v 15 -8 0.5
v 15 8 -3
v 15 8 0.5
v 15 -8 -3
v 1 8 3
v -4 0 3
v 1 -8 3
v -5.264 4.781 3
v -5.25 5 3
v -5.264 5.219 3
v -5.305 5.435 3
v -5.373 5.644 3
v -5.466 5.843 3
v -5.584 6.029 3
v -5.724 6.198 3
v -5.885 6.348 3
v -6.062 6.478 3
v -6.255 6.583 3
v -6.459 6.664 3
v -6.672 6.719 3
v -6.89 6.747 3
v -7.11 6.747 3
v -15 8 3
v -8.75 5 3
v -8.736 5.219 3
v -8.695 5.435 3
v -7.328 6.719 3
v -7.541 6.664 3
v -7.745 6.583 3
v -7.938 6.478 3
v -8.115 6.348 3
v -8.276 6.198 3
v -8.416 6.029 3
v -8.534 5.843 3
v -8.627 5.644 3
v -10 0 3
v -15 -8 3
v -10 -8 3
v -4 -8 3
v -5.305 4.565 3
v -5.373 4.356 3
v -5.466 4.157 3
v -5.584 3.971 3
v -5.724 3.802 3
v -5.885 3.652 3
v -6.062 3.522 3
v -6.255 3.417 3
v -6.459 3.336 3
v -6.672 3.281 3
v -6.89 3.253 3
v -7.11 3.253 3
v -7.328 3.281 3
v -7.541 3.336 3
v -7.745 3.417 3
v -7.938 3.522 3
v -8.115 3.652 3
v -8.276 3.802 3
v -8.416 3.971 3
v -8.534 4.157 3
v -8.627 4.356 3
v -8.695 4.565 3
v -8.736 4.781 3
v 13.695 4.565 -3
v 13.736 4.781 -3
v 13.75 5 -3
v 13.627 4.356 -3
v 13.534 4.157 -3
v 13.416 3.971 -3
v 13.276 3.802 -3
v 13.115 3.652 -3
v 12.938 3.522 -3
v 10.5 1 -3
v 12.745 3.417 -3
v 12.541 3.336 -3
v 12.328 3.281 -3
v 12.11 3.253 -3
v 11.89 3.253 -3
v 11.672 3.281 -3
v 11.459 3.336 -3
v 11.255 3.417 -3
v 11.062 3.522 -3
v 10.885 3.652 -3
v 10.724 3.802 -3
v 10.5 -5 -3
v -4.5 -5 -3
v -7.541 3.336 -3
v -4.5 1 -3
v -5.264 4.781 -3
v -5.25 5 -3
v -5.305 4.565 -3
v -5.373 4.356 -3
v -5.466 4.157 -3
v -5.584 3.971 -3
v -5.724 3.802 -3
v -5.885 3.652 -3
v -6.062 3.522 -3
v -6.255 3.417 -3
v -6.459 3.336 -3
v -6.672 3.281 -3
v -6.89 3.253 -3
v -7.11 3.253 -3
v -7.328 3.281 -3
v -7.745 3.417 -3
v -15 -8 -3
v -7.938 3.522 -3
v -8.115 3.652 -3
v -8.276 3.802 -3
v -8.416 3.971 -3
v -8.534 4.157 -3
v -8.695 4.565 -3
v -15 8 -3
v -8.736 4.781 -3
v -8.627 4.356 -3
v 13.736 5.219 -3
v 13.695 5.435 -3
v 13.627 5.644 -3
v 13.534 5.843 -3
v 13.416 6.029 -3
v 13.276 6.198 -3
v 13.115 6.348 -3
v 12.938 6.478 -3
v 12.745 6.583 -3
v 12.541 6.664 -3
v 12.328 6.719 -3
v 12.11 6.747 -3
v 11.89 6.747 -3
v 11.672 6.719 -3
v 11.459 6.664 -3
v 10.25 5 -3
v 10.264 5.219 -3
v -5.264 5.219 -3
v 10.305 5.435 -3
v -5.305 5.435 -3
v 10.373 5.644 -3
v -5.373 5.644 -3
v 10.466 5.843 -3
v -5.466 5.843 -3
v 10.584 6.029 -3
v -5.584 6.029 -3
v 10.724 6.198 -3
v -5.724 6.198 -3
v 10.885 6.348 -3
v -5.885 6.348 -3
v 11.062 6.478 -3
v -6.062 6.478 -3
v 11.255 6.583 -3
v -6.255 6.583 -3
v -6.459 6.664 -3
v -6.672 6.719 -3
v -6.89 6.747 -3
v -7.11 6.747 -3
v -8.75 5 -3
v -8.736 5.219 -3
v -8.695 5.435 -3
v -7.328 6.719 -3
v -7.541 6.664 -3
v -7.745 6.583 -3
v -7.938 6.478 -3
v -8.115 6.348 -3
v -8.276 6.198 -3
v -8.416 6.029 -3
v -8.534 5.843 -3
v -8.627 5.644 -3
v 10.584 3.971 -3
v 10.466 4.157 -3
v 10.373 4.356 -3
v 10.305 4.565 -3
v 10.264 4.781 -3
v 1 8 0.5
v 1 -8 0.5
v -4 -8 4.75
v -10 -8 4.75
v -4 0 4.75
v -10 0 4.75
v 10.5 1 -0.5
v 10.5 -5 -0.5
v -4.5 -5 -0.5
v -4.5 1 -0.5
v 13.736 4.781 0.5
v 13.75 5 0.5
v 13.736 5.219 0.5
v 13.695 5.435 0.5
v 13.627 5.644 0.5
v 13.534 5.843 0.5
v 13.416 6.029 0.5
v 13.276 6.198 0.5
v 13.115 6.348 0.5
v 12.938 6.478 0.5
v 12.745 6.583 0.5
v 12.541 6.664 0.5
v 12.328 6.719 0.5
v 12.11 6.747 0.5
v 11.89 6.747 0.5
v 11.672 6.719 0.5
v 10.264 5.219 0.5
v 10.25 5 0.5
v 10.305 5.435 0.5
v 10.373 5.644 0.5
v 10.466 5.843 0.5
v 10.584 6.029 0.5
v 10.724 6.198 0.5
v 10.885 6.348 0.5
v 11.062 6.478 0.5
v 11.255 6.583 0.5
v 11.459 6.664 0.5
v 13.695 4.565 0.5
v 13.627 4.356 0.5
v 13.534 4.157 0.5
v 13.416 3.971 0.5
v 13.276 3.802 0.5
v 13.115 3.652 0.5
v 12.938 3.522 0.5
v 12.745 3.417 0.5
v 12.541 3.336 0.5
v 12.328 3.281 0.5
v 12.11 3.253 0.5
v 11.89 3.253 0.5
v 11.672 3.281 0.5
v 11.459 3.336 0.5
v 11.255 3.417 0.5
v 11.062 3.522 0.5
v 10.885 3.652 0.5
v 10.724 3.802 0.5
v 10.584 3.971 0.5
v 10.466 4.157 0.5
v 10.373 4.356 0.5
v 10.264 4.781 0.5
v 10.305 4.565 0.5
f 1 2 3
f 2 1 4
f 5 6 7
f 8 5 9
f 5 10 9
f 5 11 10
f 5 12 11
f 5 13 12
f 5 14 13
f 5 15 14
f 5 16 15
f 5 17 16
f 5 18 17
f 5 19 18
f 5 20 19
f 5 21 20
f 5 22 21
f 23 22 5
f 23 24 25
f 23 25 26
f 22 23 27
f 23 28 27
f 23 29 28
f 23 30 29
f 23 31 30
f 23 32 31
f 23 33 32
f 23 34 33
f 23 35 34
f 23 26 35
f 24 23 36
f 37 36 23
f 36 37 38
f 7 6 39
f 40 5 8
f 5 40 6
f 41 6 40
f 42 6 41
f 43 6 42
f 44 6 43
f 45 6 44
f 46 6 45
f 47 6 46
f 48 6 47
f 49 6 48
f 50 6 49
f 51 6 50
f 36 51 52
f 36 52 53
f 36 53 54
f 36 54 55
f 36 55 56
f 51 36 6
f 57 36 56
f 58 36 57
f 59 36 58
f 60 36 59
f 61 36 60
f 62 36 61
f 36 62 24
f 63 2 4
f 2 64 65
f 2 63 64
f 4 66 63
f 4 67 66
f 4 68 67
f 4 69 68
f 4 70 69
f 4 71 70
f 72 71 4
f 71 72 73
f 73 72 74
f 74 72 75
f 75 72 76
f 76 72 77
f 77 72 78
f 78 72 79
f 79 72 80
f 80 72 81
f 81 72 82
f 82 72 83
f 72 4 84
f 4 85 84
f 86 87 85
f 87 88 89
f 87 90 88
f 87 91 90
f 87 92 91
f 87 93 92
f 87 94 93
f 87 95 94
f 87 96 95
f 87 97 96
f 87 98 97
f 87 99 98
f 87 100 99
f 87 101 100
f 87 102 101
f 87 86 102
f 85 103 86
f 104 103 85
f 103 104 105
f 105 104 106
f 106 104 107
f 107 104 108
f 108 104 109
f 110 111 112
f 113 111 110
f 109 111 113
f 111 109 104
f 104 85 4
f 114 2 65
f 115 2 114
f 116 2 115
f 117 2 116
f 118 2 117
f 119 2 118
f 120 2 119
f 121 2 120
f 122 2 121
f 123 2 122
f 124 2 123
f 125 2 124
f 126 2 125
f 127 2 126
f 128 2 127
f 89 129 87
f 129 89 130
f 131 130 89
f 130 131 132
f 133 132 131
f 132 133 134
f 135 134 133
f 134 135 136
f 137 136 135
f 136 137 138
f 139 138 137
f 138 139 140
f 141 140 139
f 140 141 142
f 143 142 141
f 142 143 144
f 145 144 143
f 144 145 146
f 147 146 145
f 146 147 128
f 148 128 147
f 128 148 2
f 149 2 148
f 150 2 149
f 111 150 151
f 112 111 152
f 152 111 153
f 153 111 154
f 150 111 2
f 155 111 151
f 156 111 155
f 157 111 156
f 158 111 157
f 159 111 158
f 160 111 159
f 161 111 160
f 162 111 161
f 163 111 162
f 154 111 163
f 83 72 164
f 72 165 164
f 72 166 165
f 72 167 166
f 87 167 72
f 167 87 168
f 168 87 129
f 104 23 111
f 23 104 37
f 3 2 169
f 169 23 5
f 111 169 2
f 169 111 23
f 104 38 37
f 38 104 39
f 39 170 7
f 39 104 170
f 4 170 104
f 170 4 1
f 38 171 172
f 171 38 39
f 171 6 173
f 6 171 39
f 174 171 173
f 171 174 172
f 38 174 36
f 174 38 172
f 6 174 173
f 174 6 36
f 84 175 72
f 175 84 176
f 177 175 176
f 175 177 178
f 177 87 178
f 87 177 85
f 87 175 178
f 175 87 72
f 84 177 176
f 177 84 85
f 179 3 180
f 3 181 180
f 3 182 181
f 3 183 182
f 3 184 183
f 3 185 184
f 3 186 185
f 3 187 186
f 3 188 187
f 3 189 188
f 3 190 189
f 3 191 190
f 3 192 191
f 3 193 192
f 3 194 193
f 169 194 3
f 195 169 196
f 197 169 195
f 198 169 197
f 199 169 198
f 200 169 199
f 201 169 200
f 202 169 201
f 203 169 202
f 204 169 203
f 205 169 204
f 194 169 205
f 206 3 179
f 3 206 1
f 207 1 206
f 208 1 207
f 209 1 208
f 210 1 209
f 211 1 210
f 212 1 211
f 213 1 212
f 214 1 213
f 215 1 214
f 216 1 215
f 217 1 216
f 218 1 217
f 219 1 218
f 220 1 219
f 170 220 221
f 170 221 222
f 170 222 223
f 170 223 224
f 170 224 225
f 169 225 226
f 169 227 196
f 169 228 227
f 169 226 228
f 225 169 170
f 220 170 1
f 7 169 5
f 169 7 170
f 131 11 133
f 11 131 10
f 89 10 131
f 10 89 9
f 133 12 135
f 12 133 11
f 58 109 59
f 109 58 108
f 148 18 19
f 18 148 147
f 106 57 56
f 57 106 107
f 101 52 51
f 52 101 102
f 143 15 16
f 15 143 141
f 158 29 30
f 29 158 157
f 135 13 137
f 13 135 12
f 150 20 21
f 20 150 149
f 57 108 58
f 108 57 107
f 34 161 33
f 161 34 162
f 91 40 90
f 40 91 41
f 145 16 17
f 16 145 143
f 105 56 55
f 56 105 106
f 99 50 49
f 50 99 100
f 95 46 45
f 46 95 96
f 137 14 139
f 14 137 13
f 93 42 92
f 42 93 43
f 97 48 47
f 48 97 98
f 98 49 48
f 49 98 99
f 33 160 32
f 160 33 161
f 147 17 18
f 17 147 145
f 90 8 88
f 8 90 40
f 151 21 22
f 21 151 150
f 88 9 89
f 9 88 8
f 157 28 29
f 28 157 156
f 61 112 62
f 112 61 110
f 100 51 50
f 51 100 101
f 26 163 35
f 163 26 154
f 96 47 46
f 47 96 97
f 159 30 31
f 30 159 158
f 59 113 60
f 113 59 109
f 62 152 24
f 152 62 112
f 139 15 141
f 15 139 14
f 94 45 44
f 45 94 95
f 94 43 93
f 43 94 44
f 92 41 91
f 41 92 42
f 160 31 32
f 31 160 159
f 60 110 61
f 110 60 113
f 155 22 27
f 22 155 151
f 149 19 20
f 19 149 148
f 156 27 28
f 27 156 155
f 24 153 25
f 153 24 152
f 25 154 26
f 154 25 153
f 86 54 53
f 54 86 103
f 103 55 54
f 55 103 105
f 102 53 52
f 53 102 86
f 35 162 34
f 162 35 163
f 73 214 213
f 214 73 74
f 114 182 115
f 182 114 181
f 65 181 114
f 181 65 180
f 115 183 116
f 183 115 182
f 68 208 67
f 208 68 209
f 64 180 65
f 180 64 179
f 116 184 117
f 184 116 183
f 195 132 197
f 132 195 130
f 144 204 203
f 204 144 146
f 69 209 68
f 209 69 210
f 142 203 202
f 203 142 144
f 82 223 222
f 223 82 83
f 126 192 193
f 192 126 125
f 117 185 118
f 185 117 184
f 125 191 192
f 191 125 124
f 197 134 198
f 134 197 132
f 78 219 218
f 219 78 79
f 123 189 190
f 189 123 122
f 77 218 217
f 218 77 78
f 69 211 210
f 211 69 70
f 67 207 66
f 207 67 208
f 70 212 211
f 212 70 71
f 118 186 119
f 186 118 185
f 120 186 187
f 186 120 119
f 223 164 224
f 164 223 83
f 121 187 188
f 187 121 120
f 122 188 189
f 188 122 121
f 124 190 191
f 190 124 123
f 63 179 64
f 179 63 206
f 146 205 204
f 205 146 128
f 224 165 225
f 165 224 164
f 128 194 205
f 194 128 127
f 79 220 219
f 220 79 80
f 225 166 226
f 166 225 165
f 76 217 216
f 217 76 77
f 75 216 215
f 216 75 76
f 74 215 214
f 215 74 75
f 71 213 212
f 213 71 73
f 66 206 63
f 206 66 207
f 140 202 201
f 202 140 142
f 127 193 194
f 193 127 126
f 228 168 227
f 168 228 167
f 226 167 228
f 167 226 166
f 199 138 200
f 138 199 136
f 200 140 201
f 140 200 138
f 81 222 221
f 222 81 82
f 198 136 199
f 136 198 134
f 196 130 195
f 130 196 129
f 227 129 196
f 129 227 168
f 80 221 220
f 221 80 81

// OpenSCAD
// Author: GrAndAG

/* [Settings] */

// Thickness of holder (mm)
thickness = 6; // [3:0.5:25]

//Economical version (requires less plastic)
economical = 1; // [0:No, 1:Yes]

// Diameters of mount holes (mm)
mount_hole_diameter = 3.5; // [2.7:0.1:4.0]

/* [Hidden] */
// to avoid renderring glitches
eps = 0.05;

module end_stop_holder() {
	$fn=50;

	difference() {
        // main body with tip
		union() {
			cube([30, 16, thickness], center = true);
			translate([-7, -4, thickness/2])
				cube([6, 8, 3.5], center = true);
		}

        // hole for contacts on back side of PCB
		translate([3, -2, -thickness/2 + 1.25 - eps/4])
			cube([15, 6, 2.5+eps/2], center = true);

        //cut some unneeded plastic
        if(economical)
            translate([8+eps/4, 0, 3.5])
                cube([14+eps/2, 16+eps, thickness], center = true);

        // two mount holes
		translate([-7, 5, 0])
			cylinder(h=thickness+eps, d=mount_hole_diameter, center = true);
		translate([12, 5, 0])
			cylinder(h=thickness+eps, d=mount_hole_diameter, center = true);
	}
}

end_stop_holder();
